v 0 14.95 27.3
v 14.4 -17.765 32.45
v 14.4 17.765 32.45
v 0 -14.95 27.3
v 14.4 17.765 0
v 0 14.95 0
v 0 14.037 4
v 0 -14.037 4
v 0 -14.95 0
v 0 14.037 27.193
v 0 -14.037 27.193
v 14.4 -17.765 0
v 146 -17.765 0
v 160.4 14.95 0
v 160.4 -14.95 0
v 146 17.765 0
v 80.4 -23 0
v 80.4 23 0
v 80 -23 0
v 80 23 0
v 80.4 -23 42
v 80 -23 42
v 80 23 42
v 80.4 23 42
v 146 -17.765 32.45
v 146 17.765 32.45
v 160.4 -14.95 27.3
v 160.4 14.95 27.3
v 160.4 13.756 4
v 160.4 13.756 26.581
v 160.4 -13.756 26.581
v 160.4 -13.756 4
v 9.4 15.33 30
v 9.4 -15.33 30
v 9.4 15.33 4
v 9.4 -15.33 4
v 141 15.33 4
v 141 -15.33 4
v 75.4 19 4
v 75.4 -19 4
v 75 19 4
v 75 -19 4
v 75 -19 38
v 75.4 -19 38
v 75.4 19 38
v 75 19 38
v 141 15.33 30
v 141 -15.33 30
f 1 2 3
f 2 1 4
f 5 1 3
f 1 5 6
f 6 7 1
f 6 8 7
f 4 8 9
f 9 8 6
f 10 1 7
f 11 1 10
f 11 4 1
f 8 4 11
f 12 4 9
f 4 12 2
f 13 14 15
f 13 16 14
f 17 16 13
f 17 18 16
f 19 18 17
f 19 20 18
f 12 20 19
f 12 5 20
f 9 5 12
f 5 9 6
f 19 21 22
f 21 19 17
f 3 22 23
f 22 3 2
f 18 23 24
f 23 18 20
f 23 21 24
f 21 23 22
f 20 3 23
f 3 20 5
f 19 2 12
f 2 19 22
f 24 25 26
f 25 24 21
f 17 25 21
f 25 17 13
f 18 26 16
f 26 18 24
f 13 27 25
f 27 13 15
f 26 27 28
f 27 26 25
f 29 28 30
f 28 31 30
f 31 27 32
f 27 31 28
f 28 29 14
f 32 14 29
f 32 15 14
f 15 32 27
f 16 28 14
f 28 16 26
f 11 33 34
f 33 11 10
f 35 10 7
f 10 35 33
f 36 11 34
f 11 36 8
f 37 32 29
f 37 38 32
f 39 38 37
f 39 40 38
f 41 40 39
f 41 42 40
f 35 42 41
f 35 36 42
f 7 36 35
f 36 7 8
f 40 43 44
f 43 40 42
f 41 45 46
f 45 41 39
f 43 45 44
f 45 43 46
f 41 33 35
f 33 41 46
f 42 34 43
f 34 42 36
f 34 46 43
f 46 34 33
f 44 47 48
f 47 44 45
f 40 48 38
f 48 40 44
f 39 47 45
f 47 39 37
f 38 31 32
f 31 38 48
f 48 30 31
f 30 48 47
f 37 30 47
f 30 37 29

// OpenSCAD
$fn = 32;

// ----------------------------------------------------------------------
// Faired channel: 160 x 46 x 42 mm, 4 mm walls, faired ends
// ----------------------------------------------------------------------

// --- parameters (mm) ---
length = 160;             // channel length
width = 46;               // channel width at mid length
height = 42;              // channel height at mid length
wall = 4;                 // side wall thickness
floor_t = 4;              // floor thickness
end_w = 29.9;             // faired end width
end_h = 27.3;             // faired end height

difference() {
  union() {
    hull() {
      translate([0, -14.95, 0]) cube([0.4, 29.9, 27.3]);
      translate([14.4, -17.765, 0]) cube([0.4, 35.53, 32.45]);
    }
    hull() {
      translate([14.4, -17.765, 0]) cube([0.4, 35.53, 32.45]);
      translate([80, -23, 0]) cube([0.4, 46, 42]);
    }
    hull() {
      translate([80, -23, 0]) cube([0.4, 46, 42]);
      translate([145.6, -17.765, 0]) cube([0.4, 35.53, 32.45]);
    }
    hull() {
      translate([145.6, -17.765, 0]) cube([0.4, 35.53, 32.45]);
      translate([160, -14.95, 0]) cube([0.4, 29.9, 27.3]);
    }
  }
  /* cavity, 5 mm proud of both ends so the ports are cut clean */
  hull() {
    translate([-5, -13.35, 4]) cube([0.4, 26.7, 21.7]);
    translate([9.4, -15.33, 4]) cube([0.4, 30.66, 26]);
  }
  hull() {
    translate([9.4, -15.33, 4]) cube([0.4, 30.66, 26]);
    translate([75, -19, 4]) cube([0.4, 38, 34]);
  }
  hull() {
    translate([75, -19, 4]) cube([0.4, 38, 34]);
    translate([140.6, -15.33, 4]) cube([0.4, 30.66, 26]);
  }
  hull() {
    translate([140.6, -15.33, 4]) cube([0.4, 30.66, 26]);
    translate([165, -13.35, 4]) cube([0.4, 26.7, 21.7]);
  }
}
